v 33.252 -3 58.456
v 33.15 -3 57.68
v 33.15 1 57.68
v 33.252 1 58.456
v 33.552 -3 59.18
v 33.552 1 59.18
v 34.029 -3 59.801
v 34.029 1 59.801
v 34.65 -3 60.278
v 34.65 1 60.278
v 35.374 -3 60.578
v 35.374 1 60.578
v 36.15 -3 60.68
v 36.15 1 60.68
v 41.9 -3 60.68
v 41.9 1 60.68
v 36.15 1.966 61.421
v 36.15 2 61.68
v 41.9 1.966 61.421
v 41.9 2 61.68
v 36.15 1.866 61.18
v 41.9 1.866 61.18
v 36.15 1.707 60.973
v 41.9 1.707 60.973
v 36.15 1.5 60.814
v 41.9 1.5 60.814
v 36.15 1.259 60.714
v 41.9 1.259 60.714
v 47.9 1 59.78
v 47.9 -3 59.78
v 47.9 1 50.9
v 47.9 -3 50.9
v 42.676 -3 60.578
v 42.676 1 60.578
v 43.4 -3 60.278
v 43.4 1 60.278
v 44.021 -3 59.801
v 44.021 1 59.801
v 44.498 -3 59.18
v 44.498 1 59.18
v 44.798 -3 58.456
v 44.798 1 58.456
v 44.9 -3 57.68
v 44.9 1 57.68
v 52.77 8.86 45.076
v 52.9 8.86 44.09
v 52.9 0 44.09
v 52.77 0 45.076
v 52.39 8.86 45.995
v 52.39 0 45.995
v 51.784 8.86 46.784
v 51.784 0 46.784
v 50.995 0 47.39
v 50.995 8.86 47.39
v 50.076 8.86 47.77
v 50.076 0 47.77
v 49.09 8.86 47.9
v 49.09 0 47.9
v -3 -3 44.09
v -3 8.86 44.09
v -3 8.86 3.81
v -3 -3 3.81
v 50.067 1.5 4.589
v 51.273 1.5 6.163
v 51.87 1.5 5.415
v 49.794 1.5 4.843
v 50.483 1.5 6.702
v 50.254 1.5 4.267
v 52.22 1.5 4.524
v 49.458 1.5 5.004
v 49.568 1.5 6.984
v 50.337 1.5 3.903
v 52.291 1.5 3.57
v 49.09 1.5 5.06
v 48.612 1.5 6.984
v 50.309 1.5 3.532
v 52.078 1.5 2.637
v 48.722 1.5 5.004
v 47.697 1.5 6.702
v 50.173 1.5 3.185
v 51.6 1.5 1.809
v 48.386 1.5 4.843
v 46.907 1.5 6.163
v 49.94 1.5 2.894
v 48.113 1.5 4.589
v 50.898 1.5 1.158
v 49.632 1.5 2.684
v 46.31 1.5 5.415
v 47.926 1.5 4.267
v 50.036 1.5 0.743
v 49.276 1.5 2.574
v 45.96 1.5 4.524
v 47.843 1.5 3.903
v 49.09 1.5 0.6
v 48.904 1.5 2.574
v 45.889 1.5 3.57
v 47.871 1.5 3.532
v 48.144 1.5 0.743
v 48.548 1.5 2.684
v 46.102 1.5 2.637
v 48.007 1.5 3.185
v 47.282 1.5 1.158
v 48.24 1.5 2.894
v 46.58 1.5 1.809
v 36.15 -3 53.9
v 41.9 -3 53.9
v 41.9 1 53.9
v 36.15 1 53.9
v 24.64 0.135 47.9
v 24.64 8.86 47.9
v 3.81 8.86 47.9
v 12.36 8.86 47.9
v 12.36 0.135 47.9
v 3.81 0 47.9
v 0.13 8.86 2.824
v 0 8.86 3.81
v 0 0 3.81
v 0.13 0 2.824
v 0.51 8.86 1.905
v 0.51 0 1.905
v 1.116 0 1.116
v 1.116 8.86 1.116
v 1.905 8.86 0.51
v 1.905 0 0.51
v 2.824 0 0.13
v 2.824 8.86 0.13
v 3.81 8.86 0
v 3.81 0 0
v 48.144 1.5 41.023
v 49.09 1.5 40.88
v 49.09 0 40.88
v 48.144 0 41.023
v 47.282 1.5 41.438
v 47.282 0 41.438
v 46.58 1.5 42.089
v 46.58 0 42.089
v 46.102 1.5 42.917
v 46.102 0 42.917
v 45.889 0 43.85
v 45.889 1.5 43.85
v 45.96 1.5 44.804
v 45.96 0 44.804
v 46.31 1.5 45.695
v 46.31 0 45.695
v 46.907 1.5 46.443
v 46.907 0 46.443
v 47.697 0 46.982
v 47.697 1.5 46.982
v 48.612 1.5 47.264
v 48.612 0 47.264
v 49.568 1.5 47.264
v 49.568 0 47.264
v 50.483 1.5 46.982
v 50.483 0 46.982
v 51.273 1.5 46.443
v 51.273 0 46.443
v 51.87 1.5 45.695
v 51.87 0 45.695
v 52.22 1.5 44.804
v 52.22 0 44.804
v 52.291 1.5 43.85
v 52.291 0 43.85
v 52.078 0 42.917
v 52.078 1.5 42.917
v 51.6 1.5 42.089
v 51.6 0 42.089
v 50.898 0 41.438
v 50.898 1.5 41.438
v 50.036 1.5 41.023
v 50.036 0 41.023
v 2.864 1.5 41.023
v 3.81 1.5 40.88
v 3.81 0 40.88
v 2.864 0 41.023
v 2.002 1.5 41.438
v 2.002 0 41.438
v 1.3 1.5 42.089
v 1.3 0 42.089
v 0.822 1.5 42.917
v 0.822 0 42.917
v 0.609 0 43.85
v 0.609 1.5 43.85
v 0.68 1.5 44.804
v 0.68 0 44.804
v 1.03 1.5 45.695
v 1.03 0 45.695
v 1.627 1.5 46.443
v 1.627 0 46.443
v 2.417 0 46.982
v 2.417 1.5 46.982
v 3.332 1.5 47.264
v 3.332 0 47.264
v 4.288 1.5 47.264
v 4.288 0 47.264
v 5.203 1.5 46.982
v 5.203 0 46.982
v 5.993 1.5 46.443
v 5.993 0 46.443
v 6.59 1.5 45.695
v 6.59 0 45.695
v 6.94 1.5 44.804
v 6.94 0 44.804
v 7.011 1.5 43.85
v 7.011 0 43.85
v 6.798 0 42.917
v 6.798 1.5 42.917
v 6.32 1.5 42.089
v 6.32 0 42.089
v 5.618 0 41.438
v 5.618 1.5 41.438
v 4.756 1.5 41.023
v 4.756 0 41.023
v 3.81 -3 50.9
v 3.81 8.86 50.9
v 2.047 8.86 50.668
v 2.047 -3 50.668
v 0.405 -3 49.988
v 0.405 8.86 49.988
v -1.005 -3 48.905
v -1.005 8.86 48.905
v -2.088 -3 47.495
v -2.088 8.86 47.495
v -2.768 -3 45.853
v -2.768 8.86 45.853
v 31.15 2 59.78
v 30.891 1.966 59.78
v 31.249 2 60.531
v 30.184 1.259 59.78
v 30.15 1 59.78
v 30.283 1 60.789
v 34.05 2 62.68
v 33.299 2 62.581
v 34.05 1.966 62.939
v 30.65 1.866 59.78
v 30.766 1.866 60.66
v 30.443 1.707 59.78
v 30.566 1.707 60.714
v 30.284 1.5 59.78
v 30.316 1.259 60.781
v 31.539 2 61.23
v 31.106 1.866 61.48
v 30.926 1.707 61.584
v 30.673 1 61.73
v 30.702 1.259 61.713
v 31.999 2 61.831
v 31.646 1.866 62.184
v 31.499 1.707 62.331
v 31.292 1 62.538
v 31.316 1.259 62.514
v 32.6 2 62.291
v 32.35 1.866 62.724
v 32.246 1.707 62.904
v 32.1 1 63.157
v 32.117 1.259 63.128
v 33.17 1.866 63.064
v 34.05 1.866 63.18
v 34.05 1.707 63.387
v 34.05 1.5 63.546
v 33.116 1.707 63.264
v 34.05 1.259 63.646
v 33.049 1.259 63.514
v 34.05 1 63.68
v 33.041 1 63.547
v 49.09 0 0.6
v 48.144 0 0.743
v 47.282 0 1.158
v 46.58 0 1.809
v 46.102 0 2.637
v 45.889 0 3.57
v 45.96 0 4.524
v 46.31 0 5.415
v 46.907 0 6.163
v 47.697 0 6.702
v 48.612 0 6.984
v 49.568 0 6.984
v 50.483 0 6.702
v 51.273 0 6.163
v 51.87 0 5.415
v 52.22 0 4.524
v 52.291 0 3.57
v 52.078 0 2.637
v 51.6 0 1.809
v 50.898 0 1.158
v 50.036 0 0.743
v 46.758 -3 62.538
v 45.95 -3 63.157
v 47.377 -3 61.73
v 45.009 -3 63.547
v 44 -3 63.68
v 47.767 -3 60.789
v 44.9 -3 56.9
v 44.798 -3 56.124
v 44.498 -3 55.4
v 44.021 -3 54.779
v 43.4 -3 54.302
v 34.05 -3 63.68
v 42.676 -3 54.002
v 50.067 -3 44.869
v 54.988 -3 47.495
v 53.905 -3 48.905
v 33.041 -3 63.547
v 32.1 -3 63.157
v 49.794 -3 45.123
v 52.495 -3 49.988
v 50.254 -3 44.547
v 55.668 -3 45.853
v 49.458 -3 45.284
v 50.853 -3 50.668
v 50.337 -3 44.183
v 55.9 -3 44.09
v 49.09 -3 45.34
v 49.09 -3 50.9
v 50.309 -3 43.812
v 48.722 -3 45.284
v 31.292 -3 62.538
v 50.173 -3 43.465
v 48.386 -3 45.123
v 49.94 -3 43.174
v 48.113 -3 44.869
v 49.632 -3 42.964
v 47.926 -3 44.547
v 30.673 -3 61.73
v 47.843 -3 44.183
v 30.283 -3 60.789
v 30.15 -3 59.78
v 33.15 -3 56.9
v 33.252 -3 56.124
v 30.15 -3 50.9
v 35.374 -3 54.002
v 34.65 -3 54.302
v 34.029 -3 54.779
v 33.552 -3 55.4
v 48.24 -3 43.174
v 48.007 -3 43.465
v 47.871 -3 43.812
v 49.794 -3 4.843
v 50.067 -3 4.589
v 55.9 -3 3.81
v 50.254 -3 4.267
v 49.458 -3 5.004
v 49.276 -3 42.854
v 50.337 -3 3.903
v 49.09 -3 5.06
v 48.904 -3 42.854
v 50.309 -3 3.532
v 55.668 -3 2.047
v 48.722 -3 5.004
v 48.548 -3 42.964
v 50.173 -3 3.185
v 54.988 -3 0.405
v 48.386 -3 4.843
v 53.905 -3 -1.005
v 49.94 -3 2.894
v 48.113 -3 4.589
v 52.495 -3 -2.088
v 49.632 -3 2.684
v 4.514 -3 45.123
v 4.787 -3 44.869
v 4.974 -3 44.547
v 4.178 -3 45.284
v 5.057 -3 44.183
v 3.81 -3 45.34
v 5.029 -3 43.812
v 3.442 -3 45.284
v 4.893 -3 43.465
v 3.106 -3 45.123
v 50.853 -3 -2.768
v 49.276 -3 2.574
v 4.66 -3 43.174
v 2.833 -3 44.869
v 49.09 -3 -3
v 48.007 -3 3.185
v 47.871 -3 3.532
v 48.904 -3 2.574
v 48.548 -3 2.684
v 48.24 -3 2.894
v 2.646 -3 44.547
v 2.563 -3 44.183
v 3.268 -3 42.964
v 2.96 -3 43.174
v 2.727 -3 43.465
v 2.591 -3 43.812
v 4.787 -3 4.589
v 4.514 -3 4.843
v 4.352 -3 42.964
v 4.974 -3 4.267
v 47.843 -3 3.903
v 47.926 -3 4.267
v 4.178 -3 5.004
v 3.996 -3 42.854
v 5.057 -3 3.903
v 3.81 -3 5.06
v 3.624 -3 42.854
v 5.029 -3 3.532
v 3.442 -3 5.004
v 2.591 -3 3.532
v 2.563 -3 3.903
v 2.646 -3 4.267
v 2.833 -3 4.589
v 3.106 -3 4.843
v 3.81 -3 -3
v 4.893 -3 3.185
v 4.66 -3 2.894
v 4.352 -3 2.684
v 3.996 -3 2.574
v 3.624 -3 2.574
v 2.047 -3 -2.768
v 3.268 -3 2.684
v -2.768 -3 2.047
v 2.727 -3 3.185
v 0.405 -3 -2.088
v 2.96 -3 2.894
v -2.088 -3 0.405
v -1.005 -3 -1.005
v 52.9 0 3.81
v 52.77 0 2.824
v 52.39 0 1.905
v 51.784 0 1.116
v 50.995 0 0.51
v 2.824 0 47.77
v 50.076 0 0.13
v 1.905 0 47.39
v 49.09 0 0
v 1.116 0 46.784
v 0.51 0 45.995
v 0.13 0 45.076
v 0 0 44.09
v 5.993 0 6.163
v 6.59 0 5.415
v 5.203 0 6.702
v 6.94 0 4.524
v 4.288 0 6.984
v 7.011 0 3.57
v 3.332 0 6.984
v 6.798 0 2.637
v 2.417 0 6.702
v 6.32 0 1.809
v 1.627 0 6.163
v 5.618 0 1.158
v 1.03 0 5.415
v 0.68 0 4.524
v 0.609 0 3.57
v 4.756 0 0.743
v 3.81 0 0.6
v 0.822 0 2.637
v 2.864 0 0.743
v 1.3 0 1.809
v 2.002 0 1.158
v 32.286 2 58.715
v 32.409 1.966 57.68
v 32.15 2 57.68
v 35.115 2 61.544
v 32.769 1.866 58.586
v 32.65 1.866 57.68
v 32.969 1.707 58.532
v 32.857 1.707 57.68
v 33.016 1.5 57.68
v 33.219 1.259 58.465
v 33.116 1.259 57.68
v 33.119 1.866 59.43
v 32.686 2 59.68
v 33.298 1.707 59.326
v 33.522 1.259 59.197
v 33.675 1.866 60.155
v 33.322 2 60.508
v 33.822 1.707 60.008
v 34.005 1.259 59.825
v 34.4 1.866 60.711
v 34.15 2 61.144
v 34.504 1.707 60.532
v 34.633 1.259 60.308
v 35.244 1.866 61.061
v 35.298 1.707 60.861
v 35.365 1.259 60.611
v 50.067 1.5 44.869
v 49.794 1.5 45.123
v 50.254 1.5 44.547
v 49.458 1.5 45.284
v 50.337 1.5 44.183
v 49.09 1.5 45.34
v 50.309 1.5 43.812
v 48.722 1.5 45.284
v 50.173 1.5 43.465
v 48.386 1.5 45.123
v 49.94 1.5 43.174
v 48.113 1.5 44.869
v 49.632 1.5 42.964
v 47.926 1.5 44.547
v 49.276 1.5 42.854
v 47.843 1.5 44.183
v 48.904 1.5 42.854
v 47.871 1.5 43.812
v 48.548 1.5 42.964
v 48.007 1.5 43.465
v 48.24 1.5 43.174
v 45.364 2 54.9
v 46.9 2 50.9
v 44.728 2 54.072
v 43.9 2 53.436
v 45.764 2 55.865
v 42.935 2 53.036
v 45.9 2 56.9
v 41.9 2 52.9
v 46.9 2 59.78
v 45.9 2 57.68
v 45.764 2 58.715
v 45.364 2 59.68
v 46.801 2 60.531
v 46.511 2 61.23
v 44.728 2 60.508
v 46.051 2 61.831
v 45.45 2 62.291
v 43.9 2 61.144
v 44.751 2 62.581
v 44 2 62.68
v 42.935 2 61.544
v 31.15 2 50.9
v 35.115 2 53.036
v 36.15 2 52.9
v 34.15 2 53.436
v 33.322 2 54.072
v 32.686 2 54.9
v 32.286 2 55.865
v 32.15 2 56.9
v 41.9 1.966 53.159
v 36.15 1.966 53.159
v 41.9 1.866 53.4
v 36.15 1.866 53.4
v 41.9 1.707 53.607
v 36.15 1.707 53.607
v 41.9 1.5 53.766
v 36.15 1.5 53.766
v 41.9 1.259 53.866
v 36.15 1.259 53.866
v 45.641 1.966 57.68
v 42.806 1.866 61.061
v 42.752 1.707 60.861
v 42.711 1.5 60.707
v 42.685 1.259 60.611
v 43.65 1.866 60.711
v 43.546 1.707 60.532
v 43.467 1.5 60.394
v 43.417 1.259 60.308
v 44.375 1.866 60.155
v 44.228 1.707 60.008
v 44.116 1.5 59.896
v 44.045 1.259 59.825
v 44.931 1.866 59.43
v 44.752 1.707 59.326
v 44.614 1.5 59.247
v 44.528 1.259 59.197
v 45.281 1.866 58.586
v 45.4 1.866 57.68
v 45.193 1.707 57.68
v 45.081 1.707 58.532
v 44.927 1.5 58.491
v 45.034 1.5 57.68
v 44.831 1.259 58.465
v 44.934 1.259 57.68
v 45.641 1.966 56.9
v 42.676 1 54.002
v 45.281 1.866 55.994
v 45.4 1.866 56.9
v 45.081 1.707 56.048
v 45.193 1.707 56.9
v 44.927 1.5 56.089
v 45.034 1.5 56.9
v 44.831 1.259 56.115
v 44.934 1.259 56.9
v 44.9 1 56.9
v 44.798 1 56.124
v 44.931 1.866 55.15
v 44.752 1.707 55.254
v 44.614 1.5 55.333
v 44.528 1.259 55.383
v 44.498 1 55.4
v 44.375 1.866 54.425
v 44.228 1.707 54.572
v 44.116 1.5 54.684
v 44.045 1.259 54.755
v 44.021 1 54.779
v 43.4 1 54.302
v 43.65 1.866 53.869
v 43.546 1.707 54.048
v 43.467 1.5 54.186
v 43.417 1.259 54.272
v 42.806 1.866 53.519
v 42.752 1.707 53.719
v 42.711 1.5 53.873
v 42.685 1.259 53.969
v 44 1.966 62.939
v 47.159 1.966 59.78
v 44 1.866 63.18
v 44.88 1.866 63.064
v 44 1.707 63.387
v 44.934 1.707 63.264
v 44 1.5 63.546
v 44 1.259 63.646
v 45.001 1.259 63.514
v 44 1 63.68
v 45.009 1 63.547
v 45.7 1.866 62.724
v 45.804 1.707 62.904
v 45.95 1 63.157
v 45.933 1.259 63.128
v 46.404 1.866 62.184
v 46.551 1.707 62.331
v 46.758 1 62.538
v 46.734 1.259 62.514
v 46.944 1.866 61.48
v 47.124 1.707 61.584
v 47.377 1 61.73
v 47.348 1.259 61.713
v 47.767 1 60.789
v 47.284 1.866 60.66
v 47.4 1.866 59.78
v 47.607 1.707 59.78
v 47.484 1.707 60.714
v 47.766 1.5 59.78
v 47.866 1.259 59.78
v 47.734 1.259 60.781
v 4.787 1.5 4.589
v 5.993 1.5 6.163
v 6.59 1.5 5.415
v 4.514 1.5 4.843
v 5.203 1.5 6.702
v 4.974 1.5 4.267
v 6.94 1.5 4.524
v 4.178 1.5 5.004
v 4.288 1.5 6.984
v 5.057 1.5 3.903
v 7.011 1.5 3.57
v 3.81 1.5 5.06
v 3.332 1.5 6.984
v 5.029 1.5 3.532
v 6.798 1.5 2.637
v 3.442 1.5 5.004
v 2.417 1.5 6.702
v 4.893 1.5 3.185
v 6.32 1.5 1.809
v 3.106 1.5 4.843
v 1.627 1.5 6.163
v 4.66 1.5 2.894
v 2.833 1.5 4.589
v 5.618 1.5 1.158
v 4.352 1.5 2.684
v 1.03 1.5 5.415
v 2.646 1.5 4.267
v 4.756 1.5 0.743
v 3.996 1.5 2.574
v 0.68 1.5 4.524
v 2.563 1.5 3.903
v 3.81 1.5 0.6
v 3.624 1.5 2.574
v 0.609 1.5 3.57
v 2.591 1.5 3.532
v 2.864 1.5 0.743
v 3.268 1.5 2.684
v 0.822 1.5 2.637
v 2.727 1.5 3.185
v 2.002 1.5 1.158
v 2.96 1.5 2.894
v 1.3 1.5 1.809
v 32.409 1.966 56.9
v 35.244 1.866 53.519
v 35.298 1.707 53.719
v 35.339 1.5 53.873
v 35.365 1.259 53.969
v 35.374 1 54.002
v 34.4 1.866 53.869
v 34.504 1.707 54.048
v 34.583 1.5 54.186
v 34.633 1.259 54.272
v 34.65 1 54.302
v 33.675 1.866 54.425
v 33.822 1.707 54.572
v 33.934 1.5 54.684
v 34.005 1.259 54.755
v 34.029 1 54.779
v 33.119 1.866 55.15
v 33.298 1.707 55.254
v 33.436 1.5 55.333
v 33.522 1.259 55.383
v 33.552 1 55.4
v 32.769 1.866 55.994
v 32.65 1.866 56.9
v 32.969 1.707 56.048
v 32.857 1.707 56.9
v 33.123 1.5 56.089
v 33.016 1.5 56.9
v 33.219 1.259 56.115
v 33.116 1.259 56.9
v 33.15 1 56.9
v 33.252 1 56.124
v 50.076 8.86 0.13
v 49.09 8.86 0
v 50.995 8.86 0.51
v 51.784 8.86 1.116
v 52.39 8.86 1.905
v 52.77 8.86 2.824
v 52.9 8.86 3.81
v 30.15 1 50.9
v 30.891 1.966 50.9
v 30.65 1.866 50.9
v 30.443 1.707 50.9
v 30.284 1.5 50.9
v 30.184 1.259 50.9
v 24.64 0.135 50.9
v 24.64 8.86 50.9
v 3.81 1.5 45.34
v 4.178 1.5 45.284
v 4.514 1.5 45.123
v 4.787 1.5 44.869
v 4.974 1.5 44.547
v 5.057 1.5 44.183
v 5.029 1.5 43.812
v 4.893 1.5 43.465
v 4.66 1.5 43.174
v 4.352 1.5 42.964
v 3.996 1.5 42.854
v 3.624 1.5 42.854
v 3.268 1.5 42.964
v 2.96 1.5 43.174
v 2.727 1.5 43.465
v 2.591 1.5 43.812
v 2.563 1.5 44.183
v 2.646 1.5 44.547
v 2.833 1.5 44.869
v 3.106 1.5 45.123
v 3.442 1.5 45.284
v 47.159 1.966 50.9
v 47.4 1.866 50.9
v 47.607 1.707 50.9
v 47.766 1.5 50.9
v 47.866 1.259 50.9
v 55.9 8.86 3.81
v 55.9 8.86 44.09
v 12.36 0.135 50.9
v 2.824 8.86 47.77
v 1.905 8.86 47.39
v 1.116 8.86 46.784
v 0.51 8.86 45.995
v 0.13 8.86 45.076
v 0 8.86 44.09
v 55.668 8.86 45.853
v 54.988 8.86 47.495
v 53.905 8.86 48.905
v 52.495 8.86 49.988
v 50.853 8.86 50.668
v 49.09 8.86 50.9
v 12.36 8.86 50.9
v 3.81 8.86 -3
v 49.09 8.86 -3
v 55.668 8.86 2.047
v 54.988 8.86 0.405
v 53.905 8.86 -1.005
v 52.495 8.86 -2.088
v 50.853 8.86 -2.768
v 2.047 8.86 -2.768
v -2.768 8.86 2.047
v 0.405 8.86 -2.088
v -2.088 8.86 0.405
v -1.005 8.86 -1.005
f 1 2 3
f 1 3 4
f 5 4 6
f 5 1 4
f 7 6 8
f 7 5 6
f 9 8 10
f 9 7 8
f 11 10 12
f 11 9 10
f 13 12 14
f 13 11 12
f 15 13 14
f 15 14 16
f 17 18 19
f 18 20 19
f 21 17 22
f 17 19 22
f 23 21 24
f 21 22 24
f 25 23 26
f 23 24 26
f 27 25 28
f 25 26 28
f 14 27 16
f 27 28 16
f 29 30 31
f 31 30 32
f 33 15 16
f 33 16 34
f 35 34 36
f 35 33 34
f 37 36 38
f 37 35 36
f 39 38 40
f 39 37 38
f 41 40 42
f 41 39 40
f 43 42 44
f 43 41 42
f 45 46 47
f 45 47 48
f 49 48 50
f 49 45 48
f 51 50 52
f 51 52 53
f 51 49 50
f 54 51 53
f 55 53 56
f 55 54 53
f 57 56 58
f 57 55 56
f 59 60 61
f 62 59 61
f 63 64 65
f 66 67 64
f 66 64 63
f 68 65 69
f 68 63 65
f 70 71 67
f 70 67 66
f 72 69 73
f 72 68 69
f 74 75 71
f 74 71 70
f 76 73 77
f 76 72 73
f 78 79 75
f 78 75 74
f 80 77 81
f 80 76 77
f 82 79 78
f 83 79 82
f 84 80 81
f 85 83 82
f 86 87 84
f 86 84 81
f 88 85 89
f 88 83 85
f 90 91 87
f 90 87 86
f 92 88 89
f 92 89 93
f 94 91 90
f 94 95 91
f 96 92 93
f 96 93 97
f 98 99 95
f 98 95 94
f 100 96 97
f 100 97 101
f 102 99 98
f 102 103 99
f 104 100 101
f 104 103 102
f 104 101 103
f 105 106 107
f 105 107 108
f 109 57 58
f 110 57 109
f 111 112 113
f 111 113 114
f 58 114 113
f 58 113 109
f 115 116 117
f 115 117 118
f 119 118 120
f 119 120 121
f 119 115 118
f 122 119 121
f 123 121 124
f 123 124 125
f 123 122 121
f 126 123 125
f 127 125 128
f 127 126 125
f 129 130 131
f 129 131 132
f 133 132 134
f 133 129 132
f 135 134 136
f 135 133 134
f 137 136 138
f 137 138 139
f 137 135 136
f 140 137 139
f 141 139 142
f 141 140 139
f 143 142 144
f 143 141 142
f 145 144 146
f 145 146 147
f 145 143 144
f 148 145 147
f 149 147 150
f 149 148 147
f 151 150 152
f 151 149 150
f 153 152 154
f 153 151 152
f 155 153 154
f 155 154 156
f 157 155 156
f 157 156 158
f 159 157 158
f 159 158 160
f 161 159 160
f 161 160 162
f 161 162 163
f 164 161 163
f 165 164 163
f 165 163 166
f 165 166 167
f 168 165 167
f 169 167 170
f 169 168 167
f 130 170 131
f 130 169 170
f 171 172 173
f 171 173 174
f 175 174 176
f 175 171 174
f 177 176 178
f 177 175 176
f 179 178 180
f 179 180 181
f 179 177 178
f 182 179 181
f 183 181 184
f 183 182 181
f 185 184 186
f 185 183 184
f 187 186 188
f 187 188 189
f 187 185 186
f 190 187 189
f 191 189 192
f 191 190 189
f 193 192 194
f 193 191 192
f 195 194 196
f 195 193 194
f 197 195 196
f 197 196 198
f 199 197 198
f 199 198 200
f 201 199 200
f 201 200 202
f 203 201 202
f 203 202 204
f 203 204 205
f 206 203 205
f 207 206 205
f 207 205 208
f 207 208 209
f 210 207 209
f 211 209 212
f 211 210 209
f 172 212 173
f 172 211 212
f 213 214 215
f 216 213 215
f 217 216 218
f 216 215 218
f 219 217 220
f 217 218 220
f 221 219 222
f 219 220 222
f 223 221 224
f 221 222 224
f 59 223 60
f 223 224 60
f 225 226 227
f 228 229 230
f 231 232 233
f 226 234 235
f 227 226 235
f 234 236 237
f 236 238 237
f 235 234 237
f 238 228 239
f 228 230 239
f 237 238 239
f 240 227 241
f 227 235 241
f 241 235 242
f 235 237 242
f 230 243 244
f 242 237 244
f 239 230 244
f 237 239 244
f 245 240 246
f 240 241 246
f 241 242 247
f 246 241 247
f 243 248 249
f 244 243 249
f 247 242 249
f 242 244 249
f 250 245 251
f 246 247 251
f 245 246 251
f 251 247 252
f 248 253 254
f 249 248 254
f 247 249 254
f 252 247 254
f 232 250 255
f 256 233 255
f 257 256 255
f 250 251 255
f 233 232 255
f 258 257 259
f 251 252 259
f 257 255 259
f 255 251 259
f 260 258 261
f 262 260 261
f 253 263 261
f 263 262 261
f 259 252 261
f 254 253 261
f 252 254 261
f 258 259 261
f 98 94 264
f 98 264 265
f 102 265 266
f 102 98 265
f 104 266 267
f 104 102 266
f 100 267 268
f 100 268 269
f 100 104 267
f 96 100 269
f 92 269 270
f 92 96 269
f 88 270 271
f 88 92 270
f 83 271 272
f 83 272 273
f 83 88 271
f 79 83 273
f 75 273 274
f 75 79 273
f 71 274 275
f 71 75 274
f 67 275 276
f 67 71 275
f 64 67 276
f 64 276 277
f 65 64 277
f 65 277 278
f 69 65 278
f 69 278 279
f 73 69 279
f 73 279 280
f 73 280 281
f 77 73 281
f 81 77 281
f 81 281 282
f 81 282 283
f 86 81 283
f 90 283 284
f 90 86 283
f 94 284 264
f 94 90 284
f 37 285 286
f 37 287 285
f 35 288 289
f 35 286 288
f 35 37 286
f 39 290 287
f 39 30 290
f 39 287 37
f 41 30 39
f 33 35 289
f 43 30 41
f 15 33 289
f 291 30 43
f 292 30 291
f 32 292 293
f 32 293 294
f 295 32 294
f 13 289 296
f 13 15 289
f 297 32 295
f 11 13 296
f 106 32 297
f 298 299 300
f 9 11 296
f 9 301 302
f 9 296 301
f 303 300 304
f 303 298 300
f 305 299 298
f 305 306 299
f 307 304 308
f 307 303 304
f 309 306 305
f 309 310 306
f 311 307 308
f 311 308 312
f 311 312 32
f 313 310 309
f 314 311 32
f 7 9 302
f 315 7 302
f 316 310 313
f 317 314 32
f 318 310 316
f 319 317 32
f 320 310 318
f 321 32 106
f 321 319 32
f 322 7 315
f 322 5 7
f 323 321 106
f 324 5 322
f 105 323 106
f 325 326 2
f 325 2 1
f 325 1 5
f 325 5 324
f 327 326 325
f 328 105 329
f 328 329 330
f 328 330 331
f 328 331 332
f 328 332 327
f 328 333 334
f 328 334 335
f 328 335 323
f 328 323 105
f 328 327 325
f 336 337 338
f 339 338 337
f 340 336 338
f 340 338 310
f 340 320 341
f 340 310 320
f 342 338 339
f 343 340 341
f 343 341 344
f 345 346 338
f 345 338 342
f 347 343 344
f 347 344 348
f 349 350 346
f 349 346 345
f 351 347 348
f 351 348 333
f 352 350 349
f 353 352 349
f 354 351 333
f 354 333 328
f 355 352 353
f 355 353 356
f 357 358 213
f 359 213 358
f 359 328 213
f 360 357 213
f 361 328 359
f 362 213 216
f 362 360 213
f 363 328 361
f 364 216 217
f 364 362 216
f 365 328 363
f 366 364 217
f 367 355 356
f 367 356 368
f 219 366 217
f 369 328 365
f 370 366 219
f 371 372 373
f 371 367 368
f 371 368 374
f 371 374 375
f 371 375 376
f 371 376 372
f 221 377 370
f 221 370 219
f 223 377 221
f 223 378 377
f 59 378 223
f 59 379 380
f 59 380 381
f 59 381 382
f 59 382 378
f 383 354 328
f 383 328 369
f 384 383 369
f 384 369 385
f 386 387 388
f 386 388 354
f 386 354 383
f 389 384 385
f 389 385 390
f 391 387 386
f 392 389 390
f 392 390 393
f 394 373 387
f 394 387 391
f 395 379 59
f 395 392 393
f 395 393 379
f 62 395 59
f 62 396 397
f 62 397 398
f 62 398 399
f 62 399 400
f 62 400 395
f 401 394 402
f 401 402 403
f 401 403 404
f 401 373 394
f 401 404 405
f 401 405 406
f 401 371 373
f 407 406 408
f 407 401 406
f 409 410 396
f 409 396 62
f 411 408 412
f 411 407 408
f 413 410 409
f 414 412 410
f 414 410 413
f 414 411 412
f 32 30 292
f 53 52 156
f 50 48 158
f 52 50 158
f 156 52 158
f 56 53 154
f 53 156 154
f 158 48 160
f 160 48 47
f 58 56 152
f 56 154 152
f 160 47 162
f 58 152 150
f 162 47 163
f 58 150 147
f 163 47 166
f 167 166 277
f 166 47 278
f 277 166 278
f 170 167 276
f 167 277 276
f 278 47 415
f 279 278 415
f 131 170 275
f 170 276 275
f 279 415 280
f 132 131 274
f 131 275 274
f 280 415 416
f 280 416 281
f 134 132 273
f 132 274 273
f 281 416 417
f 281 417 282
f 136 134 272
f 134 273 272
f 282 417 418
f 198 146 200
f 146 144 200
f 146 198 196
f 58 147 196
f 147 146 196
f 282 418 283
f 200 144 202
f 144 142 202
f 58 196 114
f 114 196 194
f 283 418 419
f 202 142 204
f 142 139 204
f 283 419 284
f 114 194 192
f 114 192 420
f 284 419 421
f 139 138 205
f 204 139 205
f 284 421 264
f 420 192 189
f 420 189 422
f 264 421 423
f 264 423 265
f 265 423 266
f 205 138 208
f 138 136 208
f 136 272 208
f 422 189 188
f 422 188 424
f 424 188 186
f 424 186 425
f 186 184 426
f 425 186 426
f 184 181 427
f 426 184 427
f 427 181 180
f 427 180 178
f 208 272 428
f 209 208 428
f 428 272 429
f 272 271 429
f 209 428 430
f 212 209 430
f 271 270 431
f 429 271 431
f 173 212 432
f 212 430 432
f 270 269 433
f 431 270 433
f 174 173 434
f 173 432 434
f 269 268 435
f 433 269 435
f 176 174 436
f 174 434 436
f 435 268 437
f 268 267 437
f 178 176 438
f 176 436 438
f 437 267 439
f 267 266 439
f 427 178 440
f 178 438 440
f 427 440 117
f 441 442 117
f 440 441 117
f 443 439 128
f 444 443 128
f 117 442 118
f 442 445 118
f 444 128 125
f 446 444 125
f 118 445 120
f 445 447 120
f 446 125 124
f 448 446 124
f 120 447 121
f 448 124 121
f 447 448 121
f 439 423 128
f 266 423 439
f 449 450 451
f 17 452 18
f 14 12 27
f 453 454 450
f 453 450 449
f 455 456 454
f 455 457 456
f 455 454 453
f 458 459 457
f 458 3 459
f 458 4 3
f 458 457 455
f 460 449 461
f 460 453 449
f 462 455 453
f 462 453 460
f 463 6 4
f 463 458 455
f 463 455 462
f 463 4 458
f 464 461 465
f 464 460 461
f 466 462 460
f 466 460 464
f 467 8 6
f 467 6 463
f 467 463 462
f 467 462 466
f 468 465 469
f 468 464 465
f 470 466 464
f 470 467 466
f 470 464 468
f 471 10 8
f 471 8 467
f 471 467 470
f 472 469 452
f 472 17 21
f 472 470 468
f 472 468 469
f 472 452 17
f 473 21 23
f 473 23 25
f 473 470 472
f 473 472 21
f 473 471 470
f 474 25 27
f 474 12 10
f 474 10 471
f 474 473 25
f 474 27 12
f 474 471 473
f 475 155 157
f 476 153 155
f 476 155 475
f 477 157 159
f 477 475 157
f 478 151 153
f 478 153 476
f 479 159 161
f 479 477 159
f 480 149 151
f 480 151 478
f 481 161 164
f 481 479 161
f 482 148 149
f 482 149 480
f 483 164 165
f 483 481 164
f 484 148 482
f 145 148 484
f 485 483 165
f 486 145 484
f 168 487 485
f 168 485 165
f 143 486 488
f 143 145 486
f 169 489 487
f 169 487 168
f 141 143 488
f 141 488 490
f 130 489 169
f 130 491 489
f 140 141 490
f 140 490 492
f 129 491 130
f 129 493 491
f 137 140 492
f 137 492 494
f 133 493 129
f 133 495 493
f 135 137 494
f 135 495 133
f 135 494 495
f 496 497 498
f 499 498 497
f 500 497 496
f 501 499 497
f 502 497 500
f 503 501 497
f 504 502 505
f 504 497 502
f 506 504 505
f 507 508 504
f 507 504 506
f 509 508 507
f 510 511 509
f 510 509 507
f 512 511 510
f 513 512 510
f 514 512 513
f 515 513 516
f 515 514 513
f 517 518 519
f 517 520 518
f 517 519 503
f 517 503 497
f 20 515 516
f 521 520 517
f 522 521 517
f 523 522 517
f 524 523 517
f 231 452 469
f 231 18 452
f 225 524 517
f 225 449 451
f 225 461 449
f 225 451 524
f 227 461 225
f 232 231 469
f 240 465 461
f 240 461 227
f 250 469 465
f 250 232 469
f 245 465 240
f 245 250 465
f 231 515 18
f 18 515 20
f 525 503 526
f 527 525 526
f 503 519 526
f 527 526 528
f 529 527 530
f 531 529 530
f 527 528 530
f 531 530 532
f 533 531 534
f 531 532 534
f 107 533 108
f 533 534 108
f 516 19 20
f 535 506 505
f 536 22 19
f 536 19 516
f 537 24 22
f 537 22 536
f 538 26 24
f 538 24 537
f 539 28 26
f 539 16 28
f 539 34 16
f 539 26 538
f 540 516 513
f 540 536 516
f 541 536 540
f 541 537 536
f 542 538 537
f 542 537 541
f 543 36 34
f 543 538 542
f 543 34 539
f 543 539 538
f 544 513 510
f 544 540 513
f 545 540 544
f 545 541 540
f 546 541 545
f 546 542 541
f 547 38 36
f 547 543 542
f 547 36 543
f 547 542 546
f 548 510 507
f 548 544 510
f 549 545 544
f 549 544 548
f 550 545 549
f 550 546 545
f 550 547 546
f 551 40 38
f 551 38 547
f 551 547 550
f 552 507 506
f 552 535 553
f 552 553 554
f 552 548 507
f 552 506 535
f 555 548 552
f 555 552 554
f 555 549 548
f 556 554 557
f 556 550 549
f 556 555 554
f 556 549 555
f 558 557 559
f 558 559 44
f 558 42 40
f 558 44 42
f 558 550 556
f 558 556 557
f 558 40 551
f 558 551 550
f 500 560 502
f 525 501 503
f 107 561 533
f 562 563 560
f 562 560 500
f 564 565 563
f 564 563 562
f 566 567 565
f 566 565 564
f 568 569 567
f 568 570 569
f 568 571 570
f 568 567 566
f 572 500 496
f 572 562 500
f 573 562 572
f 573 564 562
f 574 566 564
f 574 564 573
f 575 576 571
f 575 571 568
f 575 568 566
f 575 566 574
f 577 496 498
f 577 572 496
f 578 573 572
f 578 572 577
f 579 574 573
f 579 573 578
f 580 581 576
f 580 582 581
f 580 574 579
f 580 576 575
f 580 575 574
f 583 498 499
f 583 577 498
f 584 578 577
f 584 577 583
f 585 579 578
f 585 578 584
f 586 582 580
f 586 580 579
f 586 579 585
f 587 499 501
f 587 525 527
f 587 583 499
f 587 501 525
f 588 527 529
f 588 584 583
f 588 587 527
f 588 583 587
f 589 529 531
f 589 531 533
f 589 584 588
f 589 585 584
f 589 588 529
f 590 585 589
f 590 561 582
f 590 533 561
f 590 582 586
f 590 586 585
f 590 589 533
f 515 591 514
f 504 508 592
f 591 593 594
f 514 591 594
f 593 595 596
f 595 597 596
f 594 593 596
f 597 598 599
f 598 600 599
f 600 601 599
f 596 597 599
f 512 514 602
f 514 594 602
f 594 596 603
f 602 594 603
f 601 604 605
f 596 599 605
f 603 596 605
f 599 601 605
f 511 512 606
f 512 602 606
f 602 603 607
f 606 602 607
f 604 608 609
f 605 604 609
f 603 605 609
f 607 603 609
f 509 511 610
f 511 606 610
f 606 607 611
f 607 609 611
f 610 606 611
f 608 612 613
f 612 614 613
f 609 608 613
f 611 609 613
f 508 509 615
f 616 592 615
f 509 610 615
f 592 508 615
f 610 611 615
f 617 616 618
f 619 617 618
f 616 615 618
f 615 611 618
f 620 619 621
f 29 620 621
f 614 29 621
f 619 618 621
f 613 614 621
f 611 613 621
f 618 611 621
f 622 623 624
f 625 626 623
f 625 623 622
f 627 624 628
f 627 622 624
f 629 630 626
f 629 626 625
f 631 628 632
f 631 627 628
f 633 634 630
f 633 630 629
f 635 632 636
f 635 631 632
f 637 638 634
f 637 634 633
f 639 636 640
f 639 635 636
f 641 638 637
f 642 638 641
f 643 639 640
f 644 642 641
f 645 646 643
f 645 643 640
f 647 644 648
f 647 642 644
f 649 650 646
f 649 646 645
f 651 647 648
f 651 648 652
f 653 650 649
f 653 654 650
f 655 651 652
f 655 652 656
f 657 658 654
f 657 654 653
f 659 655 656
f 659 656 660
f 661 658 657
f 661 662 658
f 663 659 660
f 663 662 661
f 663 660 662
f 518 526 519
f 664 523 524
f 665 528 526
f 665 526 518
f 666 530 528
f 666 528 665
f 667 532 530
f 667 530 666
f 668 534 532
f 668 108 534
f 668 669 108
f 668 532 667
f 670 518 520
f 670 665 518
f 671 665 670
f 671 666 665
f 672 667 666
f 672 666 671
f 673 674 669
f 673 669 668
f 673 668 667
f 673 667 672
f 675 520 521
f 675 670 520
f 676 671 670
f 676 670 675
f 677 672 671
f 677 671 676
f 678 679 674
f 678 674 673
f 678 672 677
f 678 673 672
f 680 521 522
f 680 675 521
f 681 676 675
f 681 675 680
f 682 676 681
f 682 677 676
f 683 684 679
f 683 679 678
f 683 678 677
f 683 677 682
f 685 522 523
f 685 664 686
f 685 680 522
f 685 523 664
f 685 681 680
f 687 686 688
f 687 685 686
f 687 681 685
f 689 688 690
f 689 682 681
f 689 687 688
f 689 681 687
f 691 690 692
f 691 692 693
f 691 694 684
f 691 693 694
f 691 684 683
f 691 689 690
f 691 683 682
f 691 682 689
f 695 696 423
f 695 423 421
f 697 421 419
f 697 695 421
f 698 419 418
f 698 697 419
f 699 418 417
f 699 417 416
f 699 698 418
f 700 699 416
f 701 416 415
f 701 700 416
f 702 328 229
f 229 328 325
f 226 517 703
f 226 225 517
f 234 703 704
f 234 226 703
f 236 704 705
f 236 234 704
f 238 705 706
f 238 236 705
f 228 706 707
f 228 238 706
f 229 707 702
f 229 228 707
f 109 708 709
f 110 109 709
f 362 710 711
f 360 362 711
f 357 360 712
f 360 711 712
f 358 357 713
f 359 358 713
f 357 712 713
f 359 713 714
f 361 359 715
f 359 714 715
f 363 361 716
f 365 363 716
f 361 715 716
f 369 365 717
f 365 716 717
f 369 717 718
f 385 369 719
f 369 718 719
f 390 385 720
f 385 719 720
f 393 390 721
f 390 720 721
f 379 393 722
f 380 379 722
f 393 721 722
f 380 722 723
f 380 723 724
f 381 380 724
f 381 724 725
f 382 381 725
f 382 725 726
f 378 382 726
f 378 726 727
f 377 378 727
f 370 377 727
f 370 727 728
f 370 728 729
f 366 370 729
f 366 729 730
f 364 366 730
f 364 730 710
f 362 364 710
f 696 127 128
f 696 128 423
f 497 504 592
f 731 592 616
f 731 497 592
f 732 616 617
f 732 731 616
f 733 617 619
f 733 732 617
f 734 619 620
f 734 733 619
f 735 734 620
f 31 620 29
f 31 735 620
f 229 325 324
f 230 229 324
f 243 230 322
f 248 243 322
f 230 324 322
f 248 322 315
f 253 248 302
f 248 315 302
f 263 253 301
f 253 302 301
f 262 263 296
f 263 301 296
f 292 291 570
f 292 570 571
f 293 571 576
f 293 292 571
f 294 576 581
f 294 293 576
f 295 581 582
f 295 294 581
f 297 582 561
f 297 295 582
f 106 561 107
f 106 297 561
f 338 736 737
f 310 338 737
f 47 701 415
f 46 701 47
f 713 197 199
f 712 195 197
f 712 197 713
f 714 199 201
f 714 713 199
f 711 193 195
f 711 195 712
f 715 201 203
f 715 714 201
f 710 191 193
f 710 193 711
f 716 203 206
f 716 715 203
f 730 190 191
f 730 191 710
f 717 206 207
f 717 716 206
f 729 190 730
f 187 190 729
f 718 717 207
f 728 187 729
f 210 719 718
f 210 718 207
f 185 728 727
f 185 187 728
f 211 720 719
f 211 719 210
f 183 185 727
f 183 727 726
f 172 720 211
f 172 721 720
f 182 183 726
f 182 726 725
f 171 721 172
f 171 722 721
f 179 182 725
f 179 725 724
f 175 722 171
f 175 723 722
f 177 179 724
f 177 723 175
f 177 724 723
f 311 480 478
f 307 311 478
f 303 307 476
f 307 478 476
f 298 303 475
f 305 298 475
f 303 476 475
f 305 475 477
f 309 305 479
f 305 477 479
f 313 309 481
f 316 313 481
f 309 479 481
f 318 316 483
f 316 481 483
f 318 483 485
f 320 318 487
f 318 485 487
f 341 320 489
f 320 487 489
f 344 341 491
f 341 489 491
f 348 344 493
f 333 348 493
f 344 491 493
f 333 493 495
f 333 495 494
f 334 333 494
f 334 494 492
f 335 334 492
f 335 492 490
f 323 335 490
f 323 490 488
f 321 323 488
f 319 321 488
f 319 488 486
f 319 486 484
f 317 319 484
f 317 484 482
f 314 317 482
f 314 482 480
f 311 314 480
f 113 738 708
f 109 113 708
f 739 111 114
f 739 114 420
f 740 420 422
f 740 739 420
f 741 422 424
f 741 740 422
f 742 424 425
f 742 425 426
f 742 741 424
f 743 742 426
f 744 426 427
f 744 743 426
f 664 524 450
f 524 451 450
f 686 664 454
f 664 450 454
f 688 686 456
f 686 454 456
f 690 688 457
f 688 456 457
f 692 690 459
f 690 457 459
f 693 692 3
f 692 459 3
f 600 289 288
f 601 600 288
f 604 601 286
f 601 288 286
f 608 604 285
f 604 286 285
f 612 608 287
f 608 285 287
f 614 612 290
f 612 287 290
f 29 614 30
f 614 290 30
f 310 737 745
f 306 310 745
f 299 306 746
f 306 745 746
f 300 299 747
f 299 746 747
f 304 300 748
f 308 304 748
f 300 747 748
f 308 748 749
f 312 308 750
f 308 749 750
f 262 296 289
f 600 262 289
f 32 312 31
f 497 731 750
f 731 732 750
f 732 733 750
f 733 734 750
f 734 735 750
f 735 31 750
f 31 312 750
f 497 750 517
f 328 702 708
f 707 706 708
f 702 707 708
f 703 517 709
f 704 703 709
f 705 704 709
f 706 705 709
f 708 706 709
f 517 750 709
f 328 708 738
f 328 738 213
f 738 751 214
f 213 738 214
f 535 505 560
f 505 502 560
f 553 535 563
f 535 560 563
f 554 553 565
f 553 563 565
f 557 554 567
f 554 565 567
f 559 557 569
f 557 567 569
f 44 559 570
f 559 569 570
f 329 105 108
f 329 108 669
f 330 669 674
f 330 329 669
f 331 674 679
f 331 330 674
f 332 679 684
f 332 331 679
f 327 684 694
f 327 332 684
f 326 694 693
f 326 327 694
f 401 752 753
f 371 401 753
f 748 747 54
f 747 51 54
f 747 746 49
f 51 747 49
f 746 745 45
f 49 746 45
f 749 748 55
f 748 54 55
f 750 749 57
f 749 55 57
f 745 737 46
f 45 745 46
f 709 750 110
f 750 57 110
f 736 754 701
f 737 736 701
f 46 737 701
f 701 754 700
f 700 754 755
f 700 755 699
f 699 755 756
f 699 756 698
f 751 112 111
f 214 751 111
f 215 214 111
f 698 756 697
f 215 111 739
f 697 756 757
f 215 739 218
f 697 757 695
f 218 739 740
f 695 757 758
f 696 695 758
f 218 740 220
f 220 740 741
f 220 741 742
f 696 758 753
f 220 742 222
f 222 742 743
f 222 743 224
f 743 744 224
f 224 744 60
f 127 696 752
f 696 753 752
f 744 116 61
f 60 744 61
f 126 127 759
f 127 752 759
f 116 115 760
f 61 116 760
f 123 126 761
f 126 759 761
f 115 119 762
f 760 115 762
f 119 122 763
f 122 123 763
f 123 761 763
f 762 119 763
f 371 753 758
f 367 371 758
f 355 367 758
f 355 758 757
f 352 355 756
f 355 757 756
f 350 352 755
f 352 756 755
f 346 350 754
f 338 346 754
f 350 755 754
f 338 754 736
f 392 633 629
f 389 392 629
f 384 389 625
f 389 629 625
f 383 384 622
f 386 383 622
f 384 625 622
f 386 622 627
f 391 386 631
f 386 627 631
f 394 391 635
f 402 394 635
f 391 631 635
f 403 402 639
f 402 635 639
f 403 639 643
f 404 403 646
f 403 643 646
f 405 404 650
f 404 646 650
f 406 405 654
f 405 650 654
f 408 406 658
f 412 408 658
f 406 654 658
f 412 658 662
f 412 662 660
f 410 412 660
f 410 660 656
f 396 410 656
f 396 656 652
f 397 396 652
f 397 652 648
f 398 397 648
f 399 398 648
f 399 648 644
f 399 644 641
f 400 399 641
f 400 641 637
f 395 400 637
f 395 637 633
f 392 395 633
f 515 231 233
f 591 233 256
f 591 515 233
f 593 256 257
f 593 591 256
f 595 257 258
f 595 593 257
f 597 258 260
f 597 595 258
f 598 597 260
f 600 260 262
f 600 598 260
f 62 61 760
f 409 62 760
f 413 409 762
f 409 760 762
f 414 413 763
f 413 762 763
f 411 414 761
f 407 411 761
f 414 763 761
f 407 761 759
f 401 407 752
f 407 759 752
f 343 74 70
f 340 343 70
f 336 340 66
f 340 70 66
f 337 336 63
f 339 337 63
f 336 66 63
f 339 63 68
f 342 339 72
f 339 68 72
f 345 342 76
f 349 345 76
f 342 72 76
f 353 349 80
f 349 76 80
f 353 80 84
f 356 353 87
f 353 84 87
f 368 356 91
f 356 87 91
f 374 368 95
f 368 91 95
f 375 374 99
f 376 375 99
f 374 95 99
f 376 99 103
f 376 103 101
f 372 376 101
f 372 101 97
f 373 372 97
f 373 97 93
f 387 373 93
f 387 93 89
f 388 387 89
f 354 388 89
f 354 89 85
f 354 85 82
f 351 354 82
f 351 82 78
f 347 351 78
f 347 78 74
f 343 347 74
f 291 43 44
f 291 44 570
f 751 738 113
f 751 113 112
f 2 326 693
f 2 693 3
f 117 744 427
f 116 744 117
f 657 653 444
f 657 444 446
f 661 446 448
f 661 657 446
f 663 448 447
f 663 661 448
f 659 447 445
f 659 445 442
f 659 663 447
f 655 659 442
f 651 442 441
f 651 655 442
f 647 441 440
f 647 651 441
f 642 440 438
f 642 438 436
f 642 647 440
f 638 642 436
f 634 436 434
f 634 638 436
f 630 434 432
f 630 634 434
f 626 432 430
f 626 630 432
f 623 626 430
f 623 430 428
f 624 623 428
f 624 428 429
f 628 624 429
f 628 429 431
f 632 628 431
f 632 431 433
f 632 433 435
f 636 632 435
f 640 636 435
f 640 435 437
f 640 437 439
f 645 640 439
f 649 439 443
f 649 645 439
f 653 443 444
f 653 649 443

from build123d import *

# Parameters (mm, degrees)
BOSS_EXTRUDE1_DEPTH = 3
CUT_EXTRUDE1_REACH  = 77.661
SKETCH1_3_R         = 1.25
BOSS_EXTRUDE2_START = 8.86
BOSS_EXTRUDE2_DEPTH = 8.86
BOSS_EXTRUDE3_START = 1.5
SKETCH1_5_R         = 3.21
SKETCH1_5_R_2       = 1.25
BOSS_EXTRUDE3_DEPTH = 1.5
SKETCH2_W           = 12.28
SKETCH2_H           = 8.73
CUT_EXTRUDE2_DEPTH  = 3
BOSS_EXTRUDE7_DEPTH = 5
FILLET4_R           = 1


with BuildPart() as part:
    # Sketch1 → Boss-Extrude1 (new body)
    with BuildSketch(Plane(origin=(0, 0, 0), x_dir=(1, 0, 0), z_dir=(0, 1, 0))):
        with BuildLine():
            Line((3.81, 3), (49.09, 3))
            ThreePointArc((49.09, 3), (53.90539718, 1.00539718), (55.9, -3.81))
            Line((55.9, -3.81), (55.9, -44.09))
            ThreePointArc((55.9, -44.09), (53.90539718, -48.90539718), (49.09, -50.9))
            Line((49.09, -50.9), (3.81, -50.9))
            ThreePointArc((3.81, -50.9), (-1.00539718, -48.90539718), (-3, -44.09))
            Line((-3, -44.09), (-3, -3.81))
            ThreePointArc((-3, -3.81), (-1.00539718, 1.00539718), (3.81, 3))
        make_face()
    extrude(amount=-BOSS_EXTRUDE1_DEPTH)

    # Sketch1<3> → Cut-Extrude1 (cut, up to next)
    with BuildSketch(Plane(origin=(0, 0, 0), x_dir=(1, 0, 0), z_dir=(0, 1, 0)), mode=Mode.PRIVATE) as cut_extrude1_sk1:
        with Locations((49.09, -44.09)):
            Circle(SKETCH1_3_R)
    cut_extrude1_tool1 = extrude(cut_extrude1_sk1.sketch, amount=-CUT_EXTRUDE1_REACH, mode=Mode.PRIVATE) & part.part
    # Sketch1<3> → Cut-Extrude1 (cut, up to next)
    with BuildSketch(Plane(origin=(0, 0, 0), x_dir=(1, 0, 0), z_dir=(0, 1, 0)), mode=Mode.PRIVATE) as cut_extrude1_sk2:
        with Locations((3.81, -44.09)):
            Circle(SKETCH1_3_R)
    cut_extrude1_tool2 = extrude(cut_extrude1_sk2.sketch, amount=-CUT_EXTRUDE1_REACH, mode=Mode.PRIVATE) & part.part
    # Sketch1<3> → Cut-Extrude1 (cut, up to next)
    with BuildSketch(Plane(origin=(0, 0, 0), x_dir=(1, 0, 0), z_dir=(0, 1, 0)), mode=Mode.PRIVATE) as cut_extrude1_sk3:
        with Locations((3.81, -3.81)):
            Circle(SKETCH1_3_R)
    cut_extrude1_tool3 = extrude(cut_extrude1_sk3.sketch, amount=-CUT_EXTRUDE1_REACH, mode=Mode.PRIVATE) & part.part
    # Sketch1<3> → Cut-Extrude1 (cut, up to next)
    with BuildSketch(Plane(origin=(0, 0, 0), x_dir=(1, 0, 0), z_dir=(0, 1, 0)), mode=Mode.PRIVATE) as cut_extrude1_sk4:
        with Locations((49.09, -3.81)):
            Circle(SKETCH1_3_R)
    cut_extrude1_tool4 = extrude(cut_extrude1_sk4.sketch, amount=-CUT_EXTRUDE1_REACH, mode=Mode.PRIVATE) & part.part
    add(cut_extrude1_tool1.solids().sort_by_distance((49.09, 0, 44.09))[0], mode=Mode.SUBTRACT)
    add(cut_extrude1_tool2.solids().sort_by_distance((3.81, 0, 44.09))[0], mode=Mode.SUBTRACT)
    add(cut_extrude1_tool3.solids().sort_by_distance((3.81, 0, 3.81))[0], mode=Mode.SUBTRACT)
    add(cut_extrude1_tool4.solids().sort_by_distance((49.09, 0, 3.81))[0], mode=Mode.SUBTRACT)

    # Sketch1<4> → Boss-Extrude2 (add)
    with BuildSketch(Plane(origin=(0, 0, 0), x_dir=(1, 0, 0), z_dir=(0, 1, 0)).offset(BOSS_EXTRUDE2_START)):
        with BuildLine():
            Line((49.09, 3), (3.81, 3))
            ThreePointArc((3.81, 3), (-1.00539718, 1.00539718), (-3, -3.81))
            Line((-3, -3.81), (-3, -44.09))
            ThreePointArc((-3, -44.09), (-1.00539718, -48.90539718), (3.81, -50.9))
            Line((3.81, -50.9), (49.09, -50.9))
            ThreePointArc((49.09, -50.9), (53.90539718, -48.90539718), (55.9, -44.09))
            Line((55.9, -44.09), (55.9, -3.81))
            ThreePointArc((55.9, -3.81), (53.90539718, 1.00539718), (49.09, 3))
        make_face()
        with BuildLine():
            ThreePointArc((0, -3.81), (1.115923164, -1.115923164), (3.81, 0))
            Line((3.81, 0), (49.09, 0))
            ThreePointArc((49.09, 0), (51.784076836, -1.115923164), (52.9, -3.81))
            Line((52.9, -3.81), (52.9, -44.09))
            ThreePointArc((52.9, -44.09), (51.784076836, -46.784076836), (49.09, -47.9))
            Line((49.09, -47.9), (3.81, -47.9))
            ThreePointArc((3.81, -47.9), (1.115923164, -46.784076836), (0, -44.09))
            Line((0, -44.09), (0, -3.81))
        make_face(mode=Mode.SUBTRACT)
    extrude(amount=-BOSS_EXTRUDE2_DEPTH)

    # Sketch1<5> → Boss-Extrude3 (add)
    # profile 1 of 4: a face of its own
    with BuildSketch(Plane(origin=(0, 0, 0), x_dir=(1, 0, 0), z_dir=(0, 1, 0)).offset(BOSS_EXTRUDE3_START)):
        with Locations((3.81, -3.81)):
            Circle(SKETCH1_5_R)
        with Locations((3.81, -3.81)):
            Circle(SKETCH1_5_R_2, mode=Mode.SUBTRACT)
    # profile 2 of 4: a face of its own
    with BuildSketch(Plane(origin=(0, 0, 0), x_dir=(1, 0, 0), z_dir=(0, 1, 0)).offset(BOSS_EXTRUDE3_START)):
        with Locations((49.09, -3.81)):
            Circle(SKETCH1_5_R)
        with Locations((49.09, -3.81)):
            Circle(SKETCH1_5_R_2, mode=Mode.SUBTRACT)
    # profile 3 of 4: a face of its own
    with BuildSketch(Plane(origin=(0, 0, 0), x_dir=(1, 0, 0), z_dir=(0, 1, 0)).offset(BOSS_EXTRUDE3_START)):
        with Locations((49.09, -44.09)):
            Circle(SKETCH1_5_R)
        with Locations((49.09, -44.09)):
            Circle(SKETCH1_5_R_2, mode=Mode.SUBTRACT)
    # profile 4 of 4: a face of its own
    with BuildSketch(Plane(origin=(0, 0, 0), x_dir=(1, 0, 0), z_dir=(0, 1, 0)).offset(BOSS_EXTRUDE3_START)):
        with Locations((3.81, -44.09)):
            Circle(SKETCH1_5_R)
        with Locations((3.81, -44.09)):
            Circle(SKETCH1_5_R_2, mode=Mode.SUBTRACT)
    extrude(amount=-BOSS_EXTRUDE3_DEPTH)

    # Sketch2 → Cut-Extrude2 (cut)
    with BuildSketch(Plane.XY.offset(50.9)):
        with Locations((18.5, 4.5)):
            Rectangle(SKETCH2_W, SKETCH2_H)
    extrude(amount=-CUT_EXTRUDE2_DEPTH, mode=Mode.SUBTRACT)

    # Sketch8 → Boss-Extrude7 (add)
    with BuildSketch(Plane.XZ.offset(3)):
        with BuildLine():
            Line((47.9, 50.9), (30.15, 50.9))
            Line((30.15, 50.9), (30.15, 59.78))
            ThreePointArc((30.15, 59.78), (31.292283553, 62.537716447), (34.05, 63.68))
            Line((34.05, 63.68), (44, 63.68))
            ThreePointArc((44, 63.68), (46.757716447, 62.537716447), (47.9, 59.78))
            Line((47.9, 59.78), (47.9, 50.9))
        make_face()
        with BuildLine():
            Line((41.9, 53.9), (36.15, 53.9))
            ThreePointArc((36.15, 53.9), (34.028679656, 54.778679656), (33.15, 56.9))
            Line((33.15, 56.9), (33.15, 57.68))
            ThreePointArc((33.15, 57.68), (34.028679656, 59.801320344), (36.15, 60.68))
            Line((36.15, 60.68), (41.9, 60.68))
            ThreePointArc((41.9, 60.68), (44.021320344, 59.801320344), (44.9, 57.68))
            Line((44.9, 57.68), (44.9, 56.9))
            ThreePointArc((44.9, 56.9), (44.021320344, 54.778679656), (41.9, 53.9))
        make_face(mode=Mode.SUBTRACT)
    extrude(amount=-BOSS_EXTRUDE7_DEPTH)

    # Fillet4
    fillet4_edges = [part.edges().sort_by_distance(p)[0] for p in [
        (47.9, 2, 55.34),
        (46.757716447, 2, 62.537716447),
        (39.025, 2, 63.68),
        (31.292283553, 2, 62.537716447),
        (33.15, 2, 57.29),
        (34.028679656, 2, 59.801320344),
        (39.025, 2, 60.68),
        (44.021320344, 2, 59.801320344),
        (44.9, 2, 57.29),
        (44.021320344, 2, 54.778679656),
        (39.025, 2, 53.9),
        (30.15, 2, 55.34),
        (34.028679656, 2, 54.778679656),
    ]]
    fillet(fillet4_edges, radius=FILLET4_R)


solid = part.part
